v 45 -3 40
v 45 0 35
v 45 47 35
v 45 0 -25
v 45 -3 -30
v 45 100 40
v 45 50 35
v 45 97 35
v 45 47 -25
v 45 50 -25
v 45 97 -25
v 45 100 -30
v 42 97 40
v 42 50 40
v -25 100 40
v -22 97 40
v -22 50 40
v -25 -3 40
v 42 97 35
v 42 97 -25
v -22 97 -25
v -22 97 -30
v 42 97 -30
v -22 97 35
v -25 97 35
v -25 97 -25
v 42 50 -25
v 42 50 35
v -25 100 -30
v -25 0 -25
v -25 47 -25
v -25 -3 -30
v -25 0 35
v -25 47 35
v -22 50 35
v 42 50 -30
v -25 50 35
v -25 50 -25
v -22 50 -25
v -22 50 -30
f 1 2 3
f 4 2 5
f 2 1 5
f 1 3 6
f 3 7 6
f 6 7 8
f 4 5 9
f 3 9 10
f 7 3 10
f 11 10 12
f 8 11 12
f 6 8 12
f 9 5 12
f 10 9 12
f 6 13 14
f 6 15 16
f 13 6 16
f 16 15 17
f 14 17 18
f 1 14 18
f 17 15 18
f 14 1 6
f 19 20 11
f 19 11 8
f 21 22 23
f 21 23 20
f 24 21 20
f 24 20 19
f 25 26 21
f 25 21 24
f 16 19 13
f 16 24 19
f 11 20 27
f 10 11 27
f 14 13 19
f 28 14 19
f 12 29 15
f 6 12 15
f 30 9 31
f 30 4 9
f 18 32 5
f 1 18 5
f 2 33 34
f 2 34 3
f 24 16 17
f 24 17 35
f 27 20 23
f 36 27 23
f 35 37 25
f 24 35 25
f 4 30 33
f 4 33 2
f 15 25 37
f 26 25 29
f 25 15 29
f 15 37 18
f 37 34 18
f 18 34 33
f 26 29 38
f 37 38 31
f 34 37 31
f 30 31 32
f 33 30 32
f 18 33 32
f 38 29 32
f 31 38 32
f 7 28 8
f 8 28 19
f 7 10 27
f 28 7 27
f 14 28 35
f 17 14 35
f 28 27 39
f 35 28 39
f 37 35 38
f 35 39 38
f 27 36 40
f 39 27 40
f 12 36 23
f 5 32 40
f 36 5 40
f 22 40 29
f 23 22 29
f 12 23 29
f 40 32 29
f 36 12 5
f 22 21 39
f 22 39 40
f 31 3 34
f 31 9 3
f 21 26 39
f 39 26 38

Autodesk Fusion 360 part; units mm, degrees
sketch "Sketch1" plane through (0, 0, 0) normal (0, 1, 0) x (1, 0, 0)
  line L0 (-25, 30) -> (45, 30)
  line L1 (45, 30) -> (45, -40)
  line L2 (45, -40) -> (-25, -40)
  line L3 (-25, -40) -> (-25, 30)
  dimension "d1" = 70
  dimension "d2" = 70
extrude "Extrude1" add sketch "Sketch1" against normal blind 3
sketch "Sketch2" plane through (0, 0, 0) normal (0, 1, 0) x (-1, 0, 0)
  line L0 (25, 40) -> (-45, 40)
  line L1 (-45, 40) -> (-45, -30)
  line L2 (-45, -30) -> (25, -30)
  line L3 (25, -30) -> (25, 40)
  line L4 (25, 35) -> (-45, 35)
  line L5 (-45, 35) -> (-45, 40)
  line L6 (-45, 40) -> (25, 40)
  line L7 (25, 40) -> (25, 35)
sketch "Sketch3" plane through (0, 0, 0) normal (0, 1, 0) x (-1, 0, 0)
  line L0 (25, -30) -> (-45, -30)
  line L1 (-45, -30) -> (-45, -25)
  line L2 (-45, -25) -> (25, -25)
  line L3 (25, -25) -> (25, -30)
extrude "Extrude2" add sketch "Sketch2" sketch "Sketch3" along normal blind 50 contours L0 L1 L3 L4 L5 L6 L7 of sketch 2
sketch "Sketch4" plane through (0, 0, -25) normal (0, 0, 1) x (1, 0, 0)
  line L0 (-25, 0) -> (45, 0)
  line L1 (45, 0) -> (45, 50)
  line L2 (45, 50) -> (-25, 50)
  line L3 (-25, 50) -> (-25, 0)
  line L4 (-25, 50) -> (45, 50)
  line L5 (45, 50) -> (45, 47)
  line L6 (45, 47) -> (-25, 47)
  line L7 (-25, 47) -> (-25, 50)
extrude "Extrude3" add sketch "Sketch4" along normal blind 60 contours L1 L2 L3 L4 L5 L6 L7
sketch "Sketch5" plane through (0, 50, 0) normal (0, 1, 0) x (-1, 0, 0)
  line L0 (-45, 40) -> (-45, -30)
  line L1 (-45, -30) -> (25, -30)
  line L2 (25, -30) -> (25, 40)
  line L3 (25, 40) -> (-45, 40)
  line L4 (25, 40) -> (22, 40)
  line L5 (22, 40) -> (22, -30)
  line L6 (22, -30) -> (25, -30)
  line L7 (25, -30) -> (25, 40)
  dimension "d9" = 3
sketch "Sketch6" plane through (0, 50, 0) normal (0, 1, 0) x (-1, 0, 0)
  line L0 (-45, 40) -> (-42, 40)
  line L1 (-42, 40) -> (-42, -30)
  line L2 (-42, -30) -> (-45, -30)
  line L3 (-45, -30) -> (-45, 40)
  dimension "d10" = 3
extrude "Extrude4" add sketch "Sketch6" sketch "Sketch5" along normal blind 50 of sketch 2 contours L1 L2 L3 L4 L5 L6 L7
sketch "Sketch7" plane through (-22, 0, 0) normal (1, 0, 0) x (0, 0, -1)
  line L0 (-40, 50) -> (30, 50)
  line L1 (30, 50) -> (30, 100)
  line L2 (30, 100) -> (-40, 100)
  line L3 (-40, 100) -> (-40, 50)
  line L4 (-40, 100) -> (30, 100)
  line L5 (30, 100) -> (30, 97)
  line L6 (30, 97) -> (-40, 97)
  line L7 (-40, 97) -> (-40, 100)
  dimension "d13" = 3
extrude "Extrude5" add sketch "Sketch7" along normal blind 64 contours L1 L2 L3 L4 L5 L6 L7
sketch "Sketch8" plane through (-25, 0, 0) normal (-1, 0, 0) x (0, 0, 1)
  line L0 (-30, 100) -> (-30, -3)
  line L1 (-30, -3) -> (40, -3)
  line L2 (40, -3) -> (40, 100)
  line L3 (40, 100) -> (-30, 100)
  line L4 (-25, 47) -> (35, 47)
  line L5 (35, 47) -> (35, 0)
  line L6 (35, 0) -> (-25, 0)
  line L7 (-25, 0) -> (-25, 47)
  line L8 (-25, 50) -> (35, 50)
  line L9 (35, 50) -> (35, 97)
  line L10 (35, 97) -> (-25, 97)
  line L11 (-25, 97) -> (-25, 50)
  dimension "d16" = 60
  dimension "d17" = 47
extrude "Extrude6" cut sketch "Sketch8" against normal blind 80 contours L8 L9 L10 L11
